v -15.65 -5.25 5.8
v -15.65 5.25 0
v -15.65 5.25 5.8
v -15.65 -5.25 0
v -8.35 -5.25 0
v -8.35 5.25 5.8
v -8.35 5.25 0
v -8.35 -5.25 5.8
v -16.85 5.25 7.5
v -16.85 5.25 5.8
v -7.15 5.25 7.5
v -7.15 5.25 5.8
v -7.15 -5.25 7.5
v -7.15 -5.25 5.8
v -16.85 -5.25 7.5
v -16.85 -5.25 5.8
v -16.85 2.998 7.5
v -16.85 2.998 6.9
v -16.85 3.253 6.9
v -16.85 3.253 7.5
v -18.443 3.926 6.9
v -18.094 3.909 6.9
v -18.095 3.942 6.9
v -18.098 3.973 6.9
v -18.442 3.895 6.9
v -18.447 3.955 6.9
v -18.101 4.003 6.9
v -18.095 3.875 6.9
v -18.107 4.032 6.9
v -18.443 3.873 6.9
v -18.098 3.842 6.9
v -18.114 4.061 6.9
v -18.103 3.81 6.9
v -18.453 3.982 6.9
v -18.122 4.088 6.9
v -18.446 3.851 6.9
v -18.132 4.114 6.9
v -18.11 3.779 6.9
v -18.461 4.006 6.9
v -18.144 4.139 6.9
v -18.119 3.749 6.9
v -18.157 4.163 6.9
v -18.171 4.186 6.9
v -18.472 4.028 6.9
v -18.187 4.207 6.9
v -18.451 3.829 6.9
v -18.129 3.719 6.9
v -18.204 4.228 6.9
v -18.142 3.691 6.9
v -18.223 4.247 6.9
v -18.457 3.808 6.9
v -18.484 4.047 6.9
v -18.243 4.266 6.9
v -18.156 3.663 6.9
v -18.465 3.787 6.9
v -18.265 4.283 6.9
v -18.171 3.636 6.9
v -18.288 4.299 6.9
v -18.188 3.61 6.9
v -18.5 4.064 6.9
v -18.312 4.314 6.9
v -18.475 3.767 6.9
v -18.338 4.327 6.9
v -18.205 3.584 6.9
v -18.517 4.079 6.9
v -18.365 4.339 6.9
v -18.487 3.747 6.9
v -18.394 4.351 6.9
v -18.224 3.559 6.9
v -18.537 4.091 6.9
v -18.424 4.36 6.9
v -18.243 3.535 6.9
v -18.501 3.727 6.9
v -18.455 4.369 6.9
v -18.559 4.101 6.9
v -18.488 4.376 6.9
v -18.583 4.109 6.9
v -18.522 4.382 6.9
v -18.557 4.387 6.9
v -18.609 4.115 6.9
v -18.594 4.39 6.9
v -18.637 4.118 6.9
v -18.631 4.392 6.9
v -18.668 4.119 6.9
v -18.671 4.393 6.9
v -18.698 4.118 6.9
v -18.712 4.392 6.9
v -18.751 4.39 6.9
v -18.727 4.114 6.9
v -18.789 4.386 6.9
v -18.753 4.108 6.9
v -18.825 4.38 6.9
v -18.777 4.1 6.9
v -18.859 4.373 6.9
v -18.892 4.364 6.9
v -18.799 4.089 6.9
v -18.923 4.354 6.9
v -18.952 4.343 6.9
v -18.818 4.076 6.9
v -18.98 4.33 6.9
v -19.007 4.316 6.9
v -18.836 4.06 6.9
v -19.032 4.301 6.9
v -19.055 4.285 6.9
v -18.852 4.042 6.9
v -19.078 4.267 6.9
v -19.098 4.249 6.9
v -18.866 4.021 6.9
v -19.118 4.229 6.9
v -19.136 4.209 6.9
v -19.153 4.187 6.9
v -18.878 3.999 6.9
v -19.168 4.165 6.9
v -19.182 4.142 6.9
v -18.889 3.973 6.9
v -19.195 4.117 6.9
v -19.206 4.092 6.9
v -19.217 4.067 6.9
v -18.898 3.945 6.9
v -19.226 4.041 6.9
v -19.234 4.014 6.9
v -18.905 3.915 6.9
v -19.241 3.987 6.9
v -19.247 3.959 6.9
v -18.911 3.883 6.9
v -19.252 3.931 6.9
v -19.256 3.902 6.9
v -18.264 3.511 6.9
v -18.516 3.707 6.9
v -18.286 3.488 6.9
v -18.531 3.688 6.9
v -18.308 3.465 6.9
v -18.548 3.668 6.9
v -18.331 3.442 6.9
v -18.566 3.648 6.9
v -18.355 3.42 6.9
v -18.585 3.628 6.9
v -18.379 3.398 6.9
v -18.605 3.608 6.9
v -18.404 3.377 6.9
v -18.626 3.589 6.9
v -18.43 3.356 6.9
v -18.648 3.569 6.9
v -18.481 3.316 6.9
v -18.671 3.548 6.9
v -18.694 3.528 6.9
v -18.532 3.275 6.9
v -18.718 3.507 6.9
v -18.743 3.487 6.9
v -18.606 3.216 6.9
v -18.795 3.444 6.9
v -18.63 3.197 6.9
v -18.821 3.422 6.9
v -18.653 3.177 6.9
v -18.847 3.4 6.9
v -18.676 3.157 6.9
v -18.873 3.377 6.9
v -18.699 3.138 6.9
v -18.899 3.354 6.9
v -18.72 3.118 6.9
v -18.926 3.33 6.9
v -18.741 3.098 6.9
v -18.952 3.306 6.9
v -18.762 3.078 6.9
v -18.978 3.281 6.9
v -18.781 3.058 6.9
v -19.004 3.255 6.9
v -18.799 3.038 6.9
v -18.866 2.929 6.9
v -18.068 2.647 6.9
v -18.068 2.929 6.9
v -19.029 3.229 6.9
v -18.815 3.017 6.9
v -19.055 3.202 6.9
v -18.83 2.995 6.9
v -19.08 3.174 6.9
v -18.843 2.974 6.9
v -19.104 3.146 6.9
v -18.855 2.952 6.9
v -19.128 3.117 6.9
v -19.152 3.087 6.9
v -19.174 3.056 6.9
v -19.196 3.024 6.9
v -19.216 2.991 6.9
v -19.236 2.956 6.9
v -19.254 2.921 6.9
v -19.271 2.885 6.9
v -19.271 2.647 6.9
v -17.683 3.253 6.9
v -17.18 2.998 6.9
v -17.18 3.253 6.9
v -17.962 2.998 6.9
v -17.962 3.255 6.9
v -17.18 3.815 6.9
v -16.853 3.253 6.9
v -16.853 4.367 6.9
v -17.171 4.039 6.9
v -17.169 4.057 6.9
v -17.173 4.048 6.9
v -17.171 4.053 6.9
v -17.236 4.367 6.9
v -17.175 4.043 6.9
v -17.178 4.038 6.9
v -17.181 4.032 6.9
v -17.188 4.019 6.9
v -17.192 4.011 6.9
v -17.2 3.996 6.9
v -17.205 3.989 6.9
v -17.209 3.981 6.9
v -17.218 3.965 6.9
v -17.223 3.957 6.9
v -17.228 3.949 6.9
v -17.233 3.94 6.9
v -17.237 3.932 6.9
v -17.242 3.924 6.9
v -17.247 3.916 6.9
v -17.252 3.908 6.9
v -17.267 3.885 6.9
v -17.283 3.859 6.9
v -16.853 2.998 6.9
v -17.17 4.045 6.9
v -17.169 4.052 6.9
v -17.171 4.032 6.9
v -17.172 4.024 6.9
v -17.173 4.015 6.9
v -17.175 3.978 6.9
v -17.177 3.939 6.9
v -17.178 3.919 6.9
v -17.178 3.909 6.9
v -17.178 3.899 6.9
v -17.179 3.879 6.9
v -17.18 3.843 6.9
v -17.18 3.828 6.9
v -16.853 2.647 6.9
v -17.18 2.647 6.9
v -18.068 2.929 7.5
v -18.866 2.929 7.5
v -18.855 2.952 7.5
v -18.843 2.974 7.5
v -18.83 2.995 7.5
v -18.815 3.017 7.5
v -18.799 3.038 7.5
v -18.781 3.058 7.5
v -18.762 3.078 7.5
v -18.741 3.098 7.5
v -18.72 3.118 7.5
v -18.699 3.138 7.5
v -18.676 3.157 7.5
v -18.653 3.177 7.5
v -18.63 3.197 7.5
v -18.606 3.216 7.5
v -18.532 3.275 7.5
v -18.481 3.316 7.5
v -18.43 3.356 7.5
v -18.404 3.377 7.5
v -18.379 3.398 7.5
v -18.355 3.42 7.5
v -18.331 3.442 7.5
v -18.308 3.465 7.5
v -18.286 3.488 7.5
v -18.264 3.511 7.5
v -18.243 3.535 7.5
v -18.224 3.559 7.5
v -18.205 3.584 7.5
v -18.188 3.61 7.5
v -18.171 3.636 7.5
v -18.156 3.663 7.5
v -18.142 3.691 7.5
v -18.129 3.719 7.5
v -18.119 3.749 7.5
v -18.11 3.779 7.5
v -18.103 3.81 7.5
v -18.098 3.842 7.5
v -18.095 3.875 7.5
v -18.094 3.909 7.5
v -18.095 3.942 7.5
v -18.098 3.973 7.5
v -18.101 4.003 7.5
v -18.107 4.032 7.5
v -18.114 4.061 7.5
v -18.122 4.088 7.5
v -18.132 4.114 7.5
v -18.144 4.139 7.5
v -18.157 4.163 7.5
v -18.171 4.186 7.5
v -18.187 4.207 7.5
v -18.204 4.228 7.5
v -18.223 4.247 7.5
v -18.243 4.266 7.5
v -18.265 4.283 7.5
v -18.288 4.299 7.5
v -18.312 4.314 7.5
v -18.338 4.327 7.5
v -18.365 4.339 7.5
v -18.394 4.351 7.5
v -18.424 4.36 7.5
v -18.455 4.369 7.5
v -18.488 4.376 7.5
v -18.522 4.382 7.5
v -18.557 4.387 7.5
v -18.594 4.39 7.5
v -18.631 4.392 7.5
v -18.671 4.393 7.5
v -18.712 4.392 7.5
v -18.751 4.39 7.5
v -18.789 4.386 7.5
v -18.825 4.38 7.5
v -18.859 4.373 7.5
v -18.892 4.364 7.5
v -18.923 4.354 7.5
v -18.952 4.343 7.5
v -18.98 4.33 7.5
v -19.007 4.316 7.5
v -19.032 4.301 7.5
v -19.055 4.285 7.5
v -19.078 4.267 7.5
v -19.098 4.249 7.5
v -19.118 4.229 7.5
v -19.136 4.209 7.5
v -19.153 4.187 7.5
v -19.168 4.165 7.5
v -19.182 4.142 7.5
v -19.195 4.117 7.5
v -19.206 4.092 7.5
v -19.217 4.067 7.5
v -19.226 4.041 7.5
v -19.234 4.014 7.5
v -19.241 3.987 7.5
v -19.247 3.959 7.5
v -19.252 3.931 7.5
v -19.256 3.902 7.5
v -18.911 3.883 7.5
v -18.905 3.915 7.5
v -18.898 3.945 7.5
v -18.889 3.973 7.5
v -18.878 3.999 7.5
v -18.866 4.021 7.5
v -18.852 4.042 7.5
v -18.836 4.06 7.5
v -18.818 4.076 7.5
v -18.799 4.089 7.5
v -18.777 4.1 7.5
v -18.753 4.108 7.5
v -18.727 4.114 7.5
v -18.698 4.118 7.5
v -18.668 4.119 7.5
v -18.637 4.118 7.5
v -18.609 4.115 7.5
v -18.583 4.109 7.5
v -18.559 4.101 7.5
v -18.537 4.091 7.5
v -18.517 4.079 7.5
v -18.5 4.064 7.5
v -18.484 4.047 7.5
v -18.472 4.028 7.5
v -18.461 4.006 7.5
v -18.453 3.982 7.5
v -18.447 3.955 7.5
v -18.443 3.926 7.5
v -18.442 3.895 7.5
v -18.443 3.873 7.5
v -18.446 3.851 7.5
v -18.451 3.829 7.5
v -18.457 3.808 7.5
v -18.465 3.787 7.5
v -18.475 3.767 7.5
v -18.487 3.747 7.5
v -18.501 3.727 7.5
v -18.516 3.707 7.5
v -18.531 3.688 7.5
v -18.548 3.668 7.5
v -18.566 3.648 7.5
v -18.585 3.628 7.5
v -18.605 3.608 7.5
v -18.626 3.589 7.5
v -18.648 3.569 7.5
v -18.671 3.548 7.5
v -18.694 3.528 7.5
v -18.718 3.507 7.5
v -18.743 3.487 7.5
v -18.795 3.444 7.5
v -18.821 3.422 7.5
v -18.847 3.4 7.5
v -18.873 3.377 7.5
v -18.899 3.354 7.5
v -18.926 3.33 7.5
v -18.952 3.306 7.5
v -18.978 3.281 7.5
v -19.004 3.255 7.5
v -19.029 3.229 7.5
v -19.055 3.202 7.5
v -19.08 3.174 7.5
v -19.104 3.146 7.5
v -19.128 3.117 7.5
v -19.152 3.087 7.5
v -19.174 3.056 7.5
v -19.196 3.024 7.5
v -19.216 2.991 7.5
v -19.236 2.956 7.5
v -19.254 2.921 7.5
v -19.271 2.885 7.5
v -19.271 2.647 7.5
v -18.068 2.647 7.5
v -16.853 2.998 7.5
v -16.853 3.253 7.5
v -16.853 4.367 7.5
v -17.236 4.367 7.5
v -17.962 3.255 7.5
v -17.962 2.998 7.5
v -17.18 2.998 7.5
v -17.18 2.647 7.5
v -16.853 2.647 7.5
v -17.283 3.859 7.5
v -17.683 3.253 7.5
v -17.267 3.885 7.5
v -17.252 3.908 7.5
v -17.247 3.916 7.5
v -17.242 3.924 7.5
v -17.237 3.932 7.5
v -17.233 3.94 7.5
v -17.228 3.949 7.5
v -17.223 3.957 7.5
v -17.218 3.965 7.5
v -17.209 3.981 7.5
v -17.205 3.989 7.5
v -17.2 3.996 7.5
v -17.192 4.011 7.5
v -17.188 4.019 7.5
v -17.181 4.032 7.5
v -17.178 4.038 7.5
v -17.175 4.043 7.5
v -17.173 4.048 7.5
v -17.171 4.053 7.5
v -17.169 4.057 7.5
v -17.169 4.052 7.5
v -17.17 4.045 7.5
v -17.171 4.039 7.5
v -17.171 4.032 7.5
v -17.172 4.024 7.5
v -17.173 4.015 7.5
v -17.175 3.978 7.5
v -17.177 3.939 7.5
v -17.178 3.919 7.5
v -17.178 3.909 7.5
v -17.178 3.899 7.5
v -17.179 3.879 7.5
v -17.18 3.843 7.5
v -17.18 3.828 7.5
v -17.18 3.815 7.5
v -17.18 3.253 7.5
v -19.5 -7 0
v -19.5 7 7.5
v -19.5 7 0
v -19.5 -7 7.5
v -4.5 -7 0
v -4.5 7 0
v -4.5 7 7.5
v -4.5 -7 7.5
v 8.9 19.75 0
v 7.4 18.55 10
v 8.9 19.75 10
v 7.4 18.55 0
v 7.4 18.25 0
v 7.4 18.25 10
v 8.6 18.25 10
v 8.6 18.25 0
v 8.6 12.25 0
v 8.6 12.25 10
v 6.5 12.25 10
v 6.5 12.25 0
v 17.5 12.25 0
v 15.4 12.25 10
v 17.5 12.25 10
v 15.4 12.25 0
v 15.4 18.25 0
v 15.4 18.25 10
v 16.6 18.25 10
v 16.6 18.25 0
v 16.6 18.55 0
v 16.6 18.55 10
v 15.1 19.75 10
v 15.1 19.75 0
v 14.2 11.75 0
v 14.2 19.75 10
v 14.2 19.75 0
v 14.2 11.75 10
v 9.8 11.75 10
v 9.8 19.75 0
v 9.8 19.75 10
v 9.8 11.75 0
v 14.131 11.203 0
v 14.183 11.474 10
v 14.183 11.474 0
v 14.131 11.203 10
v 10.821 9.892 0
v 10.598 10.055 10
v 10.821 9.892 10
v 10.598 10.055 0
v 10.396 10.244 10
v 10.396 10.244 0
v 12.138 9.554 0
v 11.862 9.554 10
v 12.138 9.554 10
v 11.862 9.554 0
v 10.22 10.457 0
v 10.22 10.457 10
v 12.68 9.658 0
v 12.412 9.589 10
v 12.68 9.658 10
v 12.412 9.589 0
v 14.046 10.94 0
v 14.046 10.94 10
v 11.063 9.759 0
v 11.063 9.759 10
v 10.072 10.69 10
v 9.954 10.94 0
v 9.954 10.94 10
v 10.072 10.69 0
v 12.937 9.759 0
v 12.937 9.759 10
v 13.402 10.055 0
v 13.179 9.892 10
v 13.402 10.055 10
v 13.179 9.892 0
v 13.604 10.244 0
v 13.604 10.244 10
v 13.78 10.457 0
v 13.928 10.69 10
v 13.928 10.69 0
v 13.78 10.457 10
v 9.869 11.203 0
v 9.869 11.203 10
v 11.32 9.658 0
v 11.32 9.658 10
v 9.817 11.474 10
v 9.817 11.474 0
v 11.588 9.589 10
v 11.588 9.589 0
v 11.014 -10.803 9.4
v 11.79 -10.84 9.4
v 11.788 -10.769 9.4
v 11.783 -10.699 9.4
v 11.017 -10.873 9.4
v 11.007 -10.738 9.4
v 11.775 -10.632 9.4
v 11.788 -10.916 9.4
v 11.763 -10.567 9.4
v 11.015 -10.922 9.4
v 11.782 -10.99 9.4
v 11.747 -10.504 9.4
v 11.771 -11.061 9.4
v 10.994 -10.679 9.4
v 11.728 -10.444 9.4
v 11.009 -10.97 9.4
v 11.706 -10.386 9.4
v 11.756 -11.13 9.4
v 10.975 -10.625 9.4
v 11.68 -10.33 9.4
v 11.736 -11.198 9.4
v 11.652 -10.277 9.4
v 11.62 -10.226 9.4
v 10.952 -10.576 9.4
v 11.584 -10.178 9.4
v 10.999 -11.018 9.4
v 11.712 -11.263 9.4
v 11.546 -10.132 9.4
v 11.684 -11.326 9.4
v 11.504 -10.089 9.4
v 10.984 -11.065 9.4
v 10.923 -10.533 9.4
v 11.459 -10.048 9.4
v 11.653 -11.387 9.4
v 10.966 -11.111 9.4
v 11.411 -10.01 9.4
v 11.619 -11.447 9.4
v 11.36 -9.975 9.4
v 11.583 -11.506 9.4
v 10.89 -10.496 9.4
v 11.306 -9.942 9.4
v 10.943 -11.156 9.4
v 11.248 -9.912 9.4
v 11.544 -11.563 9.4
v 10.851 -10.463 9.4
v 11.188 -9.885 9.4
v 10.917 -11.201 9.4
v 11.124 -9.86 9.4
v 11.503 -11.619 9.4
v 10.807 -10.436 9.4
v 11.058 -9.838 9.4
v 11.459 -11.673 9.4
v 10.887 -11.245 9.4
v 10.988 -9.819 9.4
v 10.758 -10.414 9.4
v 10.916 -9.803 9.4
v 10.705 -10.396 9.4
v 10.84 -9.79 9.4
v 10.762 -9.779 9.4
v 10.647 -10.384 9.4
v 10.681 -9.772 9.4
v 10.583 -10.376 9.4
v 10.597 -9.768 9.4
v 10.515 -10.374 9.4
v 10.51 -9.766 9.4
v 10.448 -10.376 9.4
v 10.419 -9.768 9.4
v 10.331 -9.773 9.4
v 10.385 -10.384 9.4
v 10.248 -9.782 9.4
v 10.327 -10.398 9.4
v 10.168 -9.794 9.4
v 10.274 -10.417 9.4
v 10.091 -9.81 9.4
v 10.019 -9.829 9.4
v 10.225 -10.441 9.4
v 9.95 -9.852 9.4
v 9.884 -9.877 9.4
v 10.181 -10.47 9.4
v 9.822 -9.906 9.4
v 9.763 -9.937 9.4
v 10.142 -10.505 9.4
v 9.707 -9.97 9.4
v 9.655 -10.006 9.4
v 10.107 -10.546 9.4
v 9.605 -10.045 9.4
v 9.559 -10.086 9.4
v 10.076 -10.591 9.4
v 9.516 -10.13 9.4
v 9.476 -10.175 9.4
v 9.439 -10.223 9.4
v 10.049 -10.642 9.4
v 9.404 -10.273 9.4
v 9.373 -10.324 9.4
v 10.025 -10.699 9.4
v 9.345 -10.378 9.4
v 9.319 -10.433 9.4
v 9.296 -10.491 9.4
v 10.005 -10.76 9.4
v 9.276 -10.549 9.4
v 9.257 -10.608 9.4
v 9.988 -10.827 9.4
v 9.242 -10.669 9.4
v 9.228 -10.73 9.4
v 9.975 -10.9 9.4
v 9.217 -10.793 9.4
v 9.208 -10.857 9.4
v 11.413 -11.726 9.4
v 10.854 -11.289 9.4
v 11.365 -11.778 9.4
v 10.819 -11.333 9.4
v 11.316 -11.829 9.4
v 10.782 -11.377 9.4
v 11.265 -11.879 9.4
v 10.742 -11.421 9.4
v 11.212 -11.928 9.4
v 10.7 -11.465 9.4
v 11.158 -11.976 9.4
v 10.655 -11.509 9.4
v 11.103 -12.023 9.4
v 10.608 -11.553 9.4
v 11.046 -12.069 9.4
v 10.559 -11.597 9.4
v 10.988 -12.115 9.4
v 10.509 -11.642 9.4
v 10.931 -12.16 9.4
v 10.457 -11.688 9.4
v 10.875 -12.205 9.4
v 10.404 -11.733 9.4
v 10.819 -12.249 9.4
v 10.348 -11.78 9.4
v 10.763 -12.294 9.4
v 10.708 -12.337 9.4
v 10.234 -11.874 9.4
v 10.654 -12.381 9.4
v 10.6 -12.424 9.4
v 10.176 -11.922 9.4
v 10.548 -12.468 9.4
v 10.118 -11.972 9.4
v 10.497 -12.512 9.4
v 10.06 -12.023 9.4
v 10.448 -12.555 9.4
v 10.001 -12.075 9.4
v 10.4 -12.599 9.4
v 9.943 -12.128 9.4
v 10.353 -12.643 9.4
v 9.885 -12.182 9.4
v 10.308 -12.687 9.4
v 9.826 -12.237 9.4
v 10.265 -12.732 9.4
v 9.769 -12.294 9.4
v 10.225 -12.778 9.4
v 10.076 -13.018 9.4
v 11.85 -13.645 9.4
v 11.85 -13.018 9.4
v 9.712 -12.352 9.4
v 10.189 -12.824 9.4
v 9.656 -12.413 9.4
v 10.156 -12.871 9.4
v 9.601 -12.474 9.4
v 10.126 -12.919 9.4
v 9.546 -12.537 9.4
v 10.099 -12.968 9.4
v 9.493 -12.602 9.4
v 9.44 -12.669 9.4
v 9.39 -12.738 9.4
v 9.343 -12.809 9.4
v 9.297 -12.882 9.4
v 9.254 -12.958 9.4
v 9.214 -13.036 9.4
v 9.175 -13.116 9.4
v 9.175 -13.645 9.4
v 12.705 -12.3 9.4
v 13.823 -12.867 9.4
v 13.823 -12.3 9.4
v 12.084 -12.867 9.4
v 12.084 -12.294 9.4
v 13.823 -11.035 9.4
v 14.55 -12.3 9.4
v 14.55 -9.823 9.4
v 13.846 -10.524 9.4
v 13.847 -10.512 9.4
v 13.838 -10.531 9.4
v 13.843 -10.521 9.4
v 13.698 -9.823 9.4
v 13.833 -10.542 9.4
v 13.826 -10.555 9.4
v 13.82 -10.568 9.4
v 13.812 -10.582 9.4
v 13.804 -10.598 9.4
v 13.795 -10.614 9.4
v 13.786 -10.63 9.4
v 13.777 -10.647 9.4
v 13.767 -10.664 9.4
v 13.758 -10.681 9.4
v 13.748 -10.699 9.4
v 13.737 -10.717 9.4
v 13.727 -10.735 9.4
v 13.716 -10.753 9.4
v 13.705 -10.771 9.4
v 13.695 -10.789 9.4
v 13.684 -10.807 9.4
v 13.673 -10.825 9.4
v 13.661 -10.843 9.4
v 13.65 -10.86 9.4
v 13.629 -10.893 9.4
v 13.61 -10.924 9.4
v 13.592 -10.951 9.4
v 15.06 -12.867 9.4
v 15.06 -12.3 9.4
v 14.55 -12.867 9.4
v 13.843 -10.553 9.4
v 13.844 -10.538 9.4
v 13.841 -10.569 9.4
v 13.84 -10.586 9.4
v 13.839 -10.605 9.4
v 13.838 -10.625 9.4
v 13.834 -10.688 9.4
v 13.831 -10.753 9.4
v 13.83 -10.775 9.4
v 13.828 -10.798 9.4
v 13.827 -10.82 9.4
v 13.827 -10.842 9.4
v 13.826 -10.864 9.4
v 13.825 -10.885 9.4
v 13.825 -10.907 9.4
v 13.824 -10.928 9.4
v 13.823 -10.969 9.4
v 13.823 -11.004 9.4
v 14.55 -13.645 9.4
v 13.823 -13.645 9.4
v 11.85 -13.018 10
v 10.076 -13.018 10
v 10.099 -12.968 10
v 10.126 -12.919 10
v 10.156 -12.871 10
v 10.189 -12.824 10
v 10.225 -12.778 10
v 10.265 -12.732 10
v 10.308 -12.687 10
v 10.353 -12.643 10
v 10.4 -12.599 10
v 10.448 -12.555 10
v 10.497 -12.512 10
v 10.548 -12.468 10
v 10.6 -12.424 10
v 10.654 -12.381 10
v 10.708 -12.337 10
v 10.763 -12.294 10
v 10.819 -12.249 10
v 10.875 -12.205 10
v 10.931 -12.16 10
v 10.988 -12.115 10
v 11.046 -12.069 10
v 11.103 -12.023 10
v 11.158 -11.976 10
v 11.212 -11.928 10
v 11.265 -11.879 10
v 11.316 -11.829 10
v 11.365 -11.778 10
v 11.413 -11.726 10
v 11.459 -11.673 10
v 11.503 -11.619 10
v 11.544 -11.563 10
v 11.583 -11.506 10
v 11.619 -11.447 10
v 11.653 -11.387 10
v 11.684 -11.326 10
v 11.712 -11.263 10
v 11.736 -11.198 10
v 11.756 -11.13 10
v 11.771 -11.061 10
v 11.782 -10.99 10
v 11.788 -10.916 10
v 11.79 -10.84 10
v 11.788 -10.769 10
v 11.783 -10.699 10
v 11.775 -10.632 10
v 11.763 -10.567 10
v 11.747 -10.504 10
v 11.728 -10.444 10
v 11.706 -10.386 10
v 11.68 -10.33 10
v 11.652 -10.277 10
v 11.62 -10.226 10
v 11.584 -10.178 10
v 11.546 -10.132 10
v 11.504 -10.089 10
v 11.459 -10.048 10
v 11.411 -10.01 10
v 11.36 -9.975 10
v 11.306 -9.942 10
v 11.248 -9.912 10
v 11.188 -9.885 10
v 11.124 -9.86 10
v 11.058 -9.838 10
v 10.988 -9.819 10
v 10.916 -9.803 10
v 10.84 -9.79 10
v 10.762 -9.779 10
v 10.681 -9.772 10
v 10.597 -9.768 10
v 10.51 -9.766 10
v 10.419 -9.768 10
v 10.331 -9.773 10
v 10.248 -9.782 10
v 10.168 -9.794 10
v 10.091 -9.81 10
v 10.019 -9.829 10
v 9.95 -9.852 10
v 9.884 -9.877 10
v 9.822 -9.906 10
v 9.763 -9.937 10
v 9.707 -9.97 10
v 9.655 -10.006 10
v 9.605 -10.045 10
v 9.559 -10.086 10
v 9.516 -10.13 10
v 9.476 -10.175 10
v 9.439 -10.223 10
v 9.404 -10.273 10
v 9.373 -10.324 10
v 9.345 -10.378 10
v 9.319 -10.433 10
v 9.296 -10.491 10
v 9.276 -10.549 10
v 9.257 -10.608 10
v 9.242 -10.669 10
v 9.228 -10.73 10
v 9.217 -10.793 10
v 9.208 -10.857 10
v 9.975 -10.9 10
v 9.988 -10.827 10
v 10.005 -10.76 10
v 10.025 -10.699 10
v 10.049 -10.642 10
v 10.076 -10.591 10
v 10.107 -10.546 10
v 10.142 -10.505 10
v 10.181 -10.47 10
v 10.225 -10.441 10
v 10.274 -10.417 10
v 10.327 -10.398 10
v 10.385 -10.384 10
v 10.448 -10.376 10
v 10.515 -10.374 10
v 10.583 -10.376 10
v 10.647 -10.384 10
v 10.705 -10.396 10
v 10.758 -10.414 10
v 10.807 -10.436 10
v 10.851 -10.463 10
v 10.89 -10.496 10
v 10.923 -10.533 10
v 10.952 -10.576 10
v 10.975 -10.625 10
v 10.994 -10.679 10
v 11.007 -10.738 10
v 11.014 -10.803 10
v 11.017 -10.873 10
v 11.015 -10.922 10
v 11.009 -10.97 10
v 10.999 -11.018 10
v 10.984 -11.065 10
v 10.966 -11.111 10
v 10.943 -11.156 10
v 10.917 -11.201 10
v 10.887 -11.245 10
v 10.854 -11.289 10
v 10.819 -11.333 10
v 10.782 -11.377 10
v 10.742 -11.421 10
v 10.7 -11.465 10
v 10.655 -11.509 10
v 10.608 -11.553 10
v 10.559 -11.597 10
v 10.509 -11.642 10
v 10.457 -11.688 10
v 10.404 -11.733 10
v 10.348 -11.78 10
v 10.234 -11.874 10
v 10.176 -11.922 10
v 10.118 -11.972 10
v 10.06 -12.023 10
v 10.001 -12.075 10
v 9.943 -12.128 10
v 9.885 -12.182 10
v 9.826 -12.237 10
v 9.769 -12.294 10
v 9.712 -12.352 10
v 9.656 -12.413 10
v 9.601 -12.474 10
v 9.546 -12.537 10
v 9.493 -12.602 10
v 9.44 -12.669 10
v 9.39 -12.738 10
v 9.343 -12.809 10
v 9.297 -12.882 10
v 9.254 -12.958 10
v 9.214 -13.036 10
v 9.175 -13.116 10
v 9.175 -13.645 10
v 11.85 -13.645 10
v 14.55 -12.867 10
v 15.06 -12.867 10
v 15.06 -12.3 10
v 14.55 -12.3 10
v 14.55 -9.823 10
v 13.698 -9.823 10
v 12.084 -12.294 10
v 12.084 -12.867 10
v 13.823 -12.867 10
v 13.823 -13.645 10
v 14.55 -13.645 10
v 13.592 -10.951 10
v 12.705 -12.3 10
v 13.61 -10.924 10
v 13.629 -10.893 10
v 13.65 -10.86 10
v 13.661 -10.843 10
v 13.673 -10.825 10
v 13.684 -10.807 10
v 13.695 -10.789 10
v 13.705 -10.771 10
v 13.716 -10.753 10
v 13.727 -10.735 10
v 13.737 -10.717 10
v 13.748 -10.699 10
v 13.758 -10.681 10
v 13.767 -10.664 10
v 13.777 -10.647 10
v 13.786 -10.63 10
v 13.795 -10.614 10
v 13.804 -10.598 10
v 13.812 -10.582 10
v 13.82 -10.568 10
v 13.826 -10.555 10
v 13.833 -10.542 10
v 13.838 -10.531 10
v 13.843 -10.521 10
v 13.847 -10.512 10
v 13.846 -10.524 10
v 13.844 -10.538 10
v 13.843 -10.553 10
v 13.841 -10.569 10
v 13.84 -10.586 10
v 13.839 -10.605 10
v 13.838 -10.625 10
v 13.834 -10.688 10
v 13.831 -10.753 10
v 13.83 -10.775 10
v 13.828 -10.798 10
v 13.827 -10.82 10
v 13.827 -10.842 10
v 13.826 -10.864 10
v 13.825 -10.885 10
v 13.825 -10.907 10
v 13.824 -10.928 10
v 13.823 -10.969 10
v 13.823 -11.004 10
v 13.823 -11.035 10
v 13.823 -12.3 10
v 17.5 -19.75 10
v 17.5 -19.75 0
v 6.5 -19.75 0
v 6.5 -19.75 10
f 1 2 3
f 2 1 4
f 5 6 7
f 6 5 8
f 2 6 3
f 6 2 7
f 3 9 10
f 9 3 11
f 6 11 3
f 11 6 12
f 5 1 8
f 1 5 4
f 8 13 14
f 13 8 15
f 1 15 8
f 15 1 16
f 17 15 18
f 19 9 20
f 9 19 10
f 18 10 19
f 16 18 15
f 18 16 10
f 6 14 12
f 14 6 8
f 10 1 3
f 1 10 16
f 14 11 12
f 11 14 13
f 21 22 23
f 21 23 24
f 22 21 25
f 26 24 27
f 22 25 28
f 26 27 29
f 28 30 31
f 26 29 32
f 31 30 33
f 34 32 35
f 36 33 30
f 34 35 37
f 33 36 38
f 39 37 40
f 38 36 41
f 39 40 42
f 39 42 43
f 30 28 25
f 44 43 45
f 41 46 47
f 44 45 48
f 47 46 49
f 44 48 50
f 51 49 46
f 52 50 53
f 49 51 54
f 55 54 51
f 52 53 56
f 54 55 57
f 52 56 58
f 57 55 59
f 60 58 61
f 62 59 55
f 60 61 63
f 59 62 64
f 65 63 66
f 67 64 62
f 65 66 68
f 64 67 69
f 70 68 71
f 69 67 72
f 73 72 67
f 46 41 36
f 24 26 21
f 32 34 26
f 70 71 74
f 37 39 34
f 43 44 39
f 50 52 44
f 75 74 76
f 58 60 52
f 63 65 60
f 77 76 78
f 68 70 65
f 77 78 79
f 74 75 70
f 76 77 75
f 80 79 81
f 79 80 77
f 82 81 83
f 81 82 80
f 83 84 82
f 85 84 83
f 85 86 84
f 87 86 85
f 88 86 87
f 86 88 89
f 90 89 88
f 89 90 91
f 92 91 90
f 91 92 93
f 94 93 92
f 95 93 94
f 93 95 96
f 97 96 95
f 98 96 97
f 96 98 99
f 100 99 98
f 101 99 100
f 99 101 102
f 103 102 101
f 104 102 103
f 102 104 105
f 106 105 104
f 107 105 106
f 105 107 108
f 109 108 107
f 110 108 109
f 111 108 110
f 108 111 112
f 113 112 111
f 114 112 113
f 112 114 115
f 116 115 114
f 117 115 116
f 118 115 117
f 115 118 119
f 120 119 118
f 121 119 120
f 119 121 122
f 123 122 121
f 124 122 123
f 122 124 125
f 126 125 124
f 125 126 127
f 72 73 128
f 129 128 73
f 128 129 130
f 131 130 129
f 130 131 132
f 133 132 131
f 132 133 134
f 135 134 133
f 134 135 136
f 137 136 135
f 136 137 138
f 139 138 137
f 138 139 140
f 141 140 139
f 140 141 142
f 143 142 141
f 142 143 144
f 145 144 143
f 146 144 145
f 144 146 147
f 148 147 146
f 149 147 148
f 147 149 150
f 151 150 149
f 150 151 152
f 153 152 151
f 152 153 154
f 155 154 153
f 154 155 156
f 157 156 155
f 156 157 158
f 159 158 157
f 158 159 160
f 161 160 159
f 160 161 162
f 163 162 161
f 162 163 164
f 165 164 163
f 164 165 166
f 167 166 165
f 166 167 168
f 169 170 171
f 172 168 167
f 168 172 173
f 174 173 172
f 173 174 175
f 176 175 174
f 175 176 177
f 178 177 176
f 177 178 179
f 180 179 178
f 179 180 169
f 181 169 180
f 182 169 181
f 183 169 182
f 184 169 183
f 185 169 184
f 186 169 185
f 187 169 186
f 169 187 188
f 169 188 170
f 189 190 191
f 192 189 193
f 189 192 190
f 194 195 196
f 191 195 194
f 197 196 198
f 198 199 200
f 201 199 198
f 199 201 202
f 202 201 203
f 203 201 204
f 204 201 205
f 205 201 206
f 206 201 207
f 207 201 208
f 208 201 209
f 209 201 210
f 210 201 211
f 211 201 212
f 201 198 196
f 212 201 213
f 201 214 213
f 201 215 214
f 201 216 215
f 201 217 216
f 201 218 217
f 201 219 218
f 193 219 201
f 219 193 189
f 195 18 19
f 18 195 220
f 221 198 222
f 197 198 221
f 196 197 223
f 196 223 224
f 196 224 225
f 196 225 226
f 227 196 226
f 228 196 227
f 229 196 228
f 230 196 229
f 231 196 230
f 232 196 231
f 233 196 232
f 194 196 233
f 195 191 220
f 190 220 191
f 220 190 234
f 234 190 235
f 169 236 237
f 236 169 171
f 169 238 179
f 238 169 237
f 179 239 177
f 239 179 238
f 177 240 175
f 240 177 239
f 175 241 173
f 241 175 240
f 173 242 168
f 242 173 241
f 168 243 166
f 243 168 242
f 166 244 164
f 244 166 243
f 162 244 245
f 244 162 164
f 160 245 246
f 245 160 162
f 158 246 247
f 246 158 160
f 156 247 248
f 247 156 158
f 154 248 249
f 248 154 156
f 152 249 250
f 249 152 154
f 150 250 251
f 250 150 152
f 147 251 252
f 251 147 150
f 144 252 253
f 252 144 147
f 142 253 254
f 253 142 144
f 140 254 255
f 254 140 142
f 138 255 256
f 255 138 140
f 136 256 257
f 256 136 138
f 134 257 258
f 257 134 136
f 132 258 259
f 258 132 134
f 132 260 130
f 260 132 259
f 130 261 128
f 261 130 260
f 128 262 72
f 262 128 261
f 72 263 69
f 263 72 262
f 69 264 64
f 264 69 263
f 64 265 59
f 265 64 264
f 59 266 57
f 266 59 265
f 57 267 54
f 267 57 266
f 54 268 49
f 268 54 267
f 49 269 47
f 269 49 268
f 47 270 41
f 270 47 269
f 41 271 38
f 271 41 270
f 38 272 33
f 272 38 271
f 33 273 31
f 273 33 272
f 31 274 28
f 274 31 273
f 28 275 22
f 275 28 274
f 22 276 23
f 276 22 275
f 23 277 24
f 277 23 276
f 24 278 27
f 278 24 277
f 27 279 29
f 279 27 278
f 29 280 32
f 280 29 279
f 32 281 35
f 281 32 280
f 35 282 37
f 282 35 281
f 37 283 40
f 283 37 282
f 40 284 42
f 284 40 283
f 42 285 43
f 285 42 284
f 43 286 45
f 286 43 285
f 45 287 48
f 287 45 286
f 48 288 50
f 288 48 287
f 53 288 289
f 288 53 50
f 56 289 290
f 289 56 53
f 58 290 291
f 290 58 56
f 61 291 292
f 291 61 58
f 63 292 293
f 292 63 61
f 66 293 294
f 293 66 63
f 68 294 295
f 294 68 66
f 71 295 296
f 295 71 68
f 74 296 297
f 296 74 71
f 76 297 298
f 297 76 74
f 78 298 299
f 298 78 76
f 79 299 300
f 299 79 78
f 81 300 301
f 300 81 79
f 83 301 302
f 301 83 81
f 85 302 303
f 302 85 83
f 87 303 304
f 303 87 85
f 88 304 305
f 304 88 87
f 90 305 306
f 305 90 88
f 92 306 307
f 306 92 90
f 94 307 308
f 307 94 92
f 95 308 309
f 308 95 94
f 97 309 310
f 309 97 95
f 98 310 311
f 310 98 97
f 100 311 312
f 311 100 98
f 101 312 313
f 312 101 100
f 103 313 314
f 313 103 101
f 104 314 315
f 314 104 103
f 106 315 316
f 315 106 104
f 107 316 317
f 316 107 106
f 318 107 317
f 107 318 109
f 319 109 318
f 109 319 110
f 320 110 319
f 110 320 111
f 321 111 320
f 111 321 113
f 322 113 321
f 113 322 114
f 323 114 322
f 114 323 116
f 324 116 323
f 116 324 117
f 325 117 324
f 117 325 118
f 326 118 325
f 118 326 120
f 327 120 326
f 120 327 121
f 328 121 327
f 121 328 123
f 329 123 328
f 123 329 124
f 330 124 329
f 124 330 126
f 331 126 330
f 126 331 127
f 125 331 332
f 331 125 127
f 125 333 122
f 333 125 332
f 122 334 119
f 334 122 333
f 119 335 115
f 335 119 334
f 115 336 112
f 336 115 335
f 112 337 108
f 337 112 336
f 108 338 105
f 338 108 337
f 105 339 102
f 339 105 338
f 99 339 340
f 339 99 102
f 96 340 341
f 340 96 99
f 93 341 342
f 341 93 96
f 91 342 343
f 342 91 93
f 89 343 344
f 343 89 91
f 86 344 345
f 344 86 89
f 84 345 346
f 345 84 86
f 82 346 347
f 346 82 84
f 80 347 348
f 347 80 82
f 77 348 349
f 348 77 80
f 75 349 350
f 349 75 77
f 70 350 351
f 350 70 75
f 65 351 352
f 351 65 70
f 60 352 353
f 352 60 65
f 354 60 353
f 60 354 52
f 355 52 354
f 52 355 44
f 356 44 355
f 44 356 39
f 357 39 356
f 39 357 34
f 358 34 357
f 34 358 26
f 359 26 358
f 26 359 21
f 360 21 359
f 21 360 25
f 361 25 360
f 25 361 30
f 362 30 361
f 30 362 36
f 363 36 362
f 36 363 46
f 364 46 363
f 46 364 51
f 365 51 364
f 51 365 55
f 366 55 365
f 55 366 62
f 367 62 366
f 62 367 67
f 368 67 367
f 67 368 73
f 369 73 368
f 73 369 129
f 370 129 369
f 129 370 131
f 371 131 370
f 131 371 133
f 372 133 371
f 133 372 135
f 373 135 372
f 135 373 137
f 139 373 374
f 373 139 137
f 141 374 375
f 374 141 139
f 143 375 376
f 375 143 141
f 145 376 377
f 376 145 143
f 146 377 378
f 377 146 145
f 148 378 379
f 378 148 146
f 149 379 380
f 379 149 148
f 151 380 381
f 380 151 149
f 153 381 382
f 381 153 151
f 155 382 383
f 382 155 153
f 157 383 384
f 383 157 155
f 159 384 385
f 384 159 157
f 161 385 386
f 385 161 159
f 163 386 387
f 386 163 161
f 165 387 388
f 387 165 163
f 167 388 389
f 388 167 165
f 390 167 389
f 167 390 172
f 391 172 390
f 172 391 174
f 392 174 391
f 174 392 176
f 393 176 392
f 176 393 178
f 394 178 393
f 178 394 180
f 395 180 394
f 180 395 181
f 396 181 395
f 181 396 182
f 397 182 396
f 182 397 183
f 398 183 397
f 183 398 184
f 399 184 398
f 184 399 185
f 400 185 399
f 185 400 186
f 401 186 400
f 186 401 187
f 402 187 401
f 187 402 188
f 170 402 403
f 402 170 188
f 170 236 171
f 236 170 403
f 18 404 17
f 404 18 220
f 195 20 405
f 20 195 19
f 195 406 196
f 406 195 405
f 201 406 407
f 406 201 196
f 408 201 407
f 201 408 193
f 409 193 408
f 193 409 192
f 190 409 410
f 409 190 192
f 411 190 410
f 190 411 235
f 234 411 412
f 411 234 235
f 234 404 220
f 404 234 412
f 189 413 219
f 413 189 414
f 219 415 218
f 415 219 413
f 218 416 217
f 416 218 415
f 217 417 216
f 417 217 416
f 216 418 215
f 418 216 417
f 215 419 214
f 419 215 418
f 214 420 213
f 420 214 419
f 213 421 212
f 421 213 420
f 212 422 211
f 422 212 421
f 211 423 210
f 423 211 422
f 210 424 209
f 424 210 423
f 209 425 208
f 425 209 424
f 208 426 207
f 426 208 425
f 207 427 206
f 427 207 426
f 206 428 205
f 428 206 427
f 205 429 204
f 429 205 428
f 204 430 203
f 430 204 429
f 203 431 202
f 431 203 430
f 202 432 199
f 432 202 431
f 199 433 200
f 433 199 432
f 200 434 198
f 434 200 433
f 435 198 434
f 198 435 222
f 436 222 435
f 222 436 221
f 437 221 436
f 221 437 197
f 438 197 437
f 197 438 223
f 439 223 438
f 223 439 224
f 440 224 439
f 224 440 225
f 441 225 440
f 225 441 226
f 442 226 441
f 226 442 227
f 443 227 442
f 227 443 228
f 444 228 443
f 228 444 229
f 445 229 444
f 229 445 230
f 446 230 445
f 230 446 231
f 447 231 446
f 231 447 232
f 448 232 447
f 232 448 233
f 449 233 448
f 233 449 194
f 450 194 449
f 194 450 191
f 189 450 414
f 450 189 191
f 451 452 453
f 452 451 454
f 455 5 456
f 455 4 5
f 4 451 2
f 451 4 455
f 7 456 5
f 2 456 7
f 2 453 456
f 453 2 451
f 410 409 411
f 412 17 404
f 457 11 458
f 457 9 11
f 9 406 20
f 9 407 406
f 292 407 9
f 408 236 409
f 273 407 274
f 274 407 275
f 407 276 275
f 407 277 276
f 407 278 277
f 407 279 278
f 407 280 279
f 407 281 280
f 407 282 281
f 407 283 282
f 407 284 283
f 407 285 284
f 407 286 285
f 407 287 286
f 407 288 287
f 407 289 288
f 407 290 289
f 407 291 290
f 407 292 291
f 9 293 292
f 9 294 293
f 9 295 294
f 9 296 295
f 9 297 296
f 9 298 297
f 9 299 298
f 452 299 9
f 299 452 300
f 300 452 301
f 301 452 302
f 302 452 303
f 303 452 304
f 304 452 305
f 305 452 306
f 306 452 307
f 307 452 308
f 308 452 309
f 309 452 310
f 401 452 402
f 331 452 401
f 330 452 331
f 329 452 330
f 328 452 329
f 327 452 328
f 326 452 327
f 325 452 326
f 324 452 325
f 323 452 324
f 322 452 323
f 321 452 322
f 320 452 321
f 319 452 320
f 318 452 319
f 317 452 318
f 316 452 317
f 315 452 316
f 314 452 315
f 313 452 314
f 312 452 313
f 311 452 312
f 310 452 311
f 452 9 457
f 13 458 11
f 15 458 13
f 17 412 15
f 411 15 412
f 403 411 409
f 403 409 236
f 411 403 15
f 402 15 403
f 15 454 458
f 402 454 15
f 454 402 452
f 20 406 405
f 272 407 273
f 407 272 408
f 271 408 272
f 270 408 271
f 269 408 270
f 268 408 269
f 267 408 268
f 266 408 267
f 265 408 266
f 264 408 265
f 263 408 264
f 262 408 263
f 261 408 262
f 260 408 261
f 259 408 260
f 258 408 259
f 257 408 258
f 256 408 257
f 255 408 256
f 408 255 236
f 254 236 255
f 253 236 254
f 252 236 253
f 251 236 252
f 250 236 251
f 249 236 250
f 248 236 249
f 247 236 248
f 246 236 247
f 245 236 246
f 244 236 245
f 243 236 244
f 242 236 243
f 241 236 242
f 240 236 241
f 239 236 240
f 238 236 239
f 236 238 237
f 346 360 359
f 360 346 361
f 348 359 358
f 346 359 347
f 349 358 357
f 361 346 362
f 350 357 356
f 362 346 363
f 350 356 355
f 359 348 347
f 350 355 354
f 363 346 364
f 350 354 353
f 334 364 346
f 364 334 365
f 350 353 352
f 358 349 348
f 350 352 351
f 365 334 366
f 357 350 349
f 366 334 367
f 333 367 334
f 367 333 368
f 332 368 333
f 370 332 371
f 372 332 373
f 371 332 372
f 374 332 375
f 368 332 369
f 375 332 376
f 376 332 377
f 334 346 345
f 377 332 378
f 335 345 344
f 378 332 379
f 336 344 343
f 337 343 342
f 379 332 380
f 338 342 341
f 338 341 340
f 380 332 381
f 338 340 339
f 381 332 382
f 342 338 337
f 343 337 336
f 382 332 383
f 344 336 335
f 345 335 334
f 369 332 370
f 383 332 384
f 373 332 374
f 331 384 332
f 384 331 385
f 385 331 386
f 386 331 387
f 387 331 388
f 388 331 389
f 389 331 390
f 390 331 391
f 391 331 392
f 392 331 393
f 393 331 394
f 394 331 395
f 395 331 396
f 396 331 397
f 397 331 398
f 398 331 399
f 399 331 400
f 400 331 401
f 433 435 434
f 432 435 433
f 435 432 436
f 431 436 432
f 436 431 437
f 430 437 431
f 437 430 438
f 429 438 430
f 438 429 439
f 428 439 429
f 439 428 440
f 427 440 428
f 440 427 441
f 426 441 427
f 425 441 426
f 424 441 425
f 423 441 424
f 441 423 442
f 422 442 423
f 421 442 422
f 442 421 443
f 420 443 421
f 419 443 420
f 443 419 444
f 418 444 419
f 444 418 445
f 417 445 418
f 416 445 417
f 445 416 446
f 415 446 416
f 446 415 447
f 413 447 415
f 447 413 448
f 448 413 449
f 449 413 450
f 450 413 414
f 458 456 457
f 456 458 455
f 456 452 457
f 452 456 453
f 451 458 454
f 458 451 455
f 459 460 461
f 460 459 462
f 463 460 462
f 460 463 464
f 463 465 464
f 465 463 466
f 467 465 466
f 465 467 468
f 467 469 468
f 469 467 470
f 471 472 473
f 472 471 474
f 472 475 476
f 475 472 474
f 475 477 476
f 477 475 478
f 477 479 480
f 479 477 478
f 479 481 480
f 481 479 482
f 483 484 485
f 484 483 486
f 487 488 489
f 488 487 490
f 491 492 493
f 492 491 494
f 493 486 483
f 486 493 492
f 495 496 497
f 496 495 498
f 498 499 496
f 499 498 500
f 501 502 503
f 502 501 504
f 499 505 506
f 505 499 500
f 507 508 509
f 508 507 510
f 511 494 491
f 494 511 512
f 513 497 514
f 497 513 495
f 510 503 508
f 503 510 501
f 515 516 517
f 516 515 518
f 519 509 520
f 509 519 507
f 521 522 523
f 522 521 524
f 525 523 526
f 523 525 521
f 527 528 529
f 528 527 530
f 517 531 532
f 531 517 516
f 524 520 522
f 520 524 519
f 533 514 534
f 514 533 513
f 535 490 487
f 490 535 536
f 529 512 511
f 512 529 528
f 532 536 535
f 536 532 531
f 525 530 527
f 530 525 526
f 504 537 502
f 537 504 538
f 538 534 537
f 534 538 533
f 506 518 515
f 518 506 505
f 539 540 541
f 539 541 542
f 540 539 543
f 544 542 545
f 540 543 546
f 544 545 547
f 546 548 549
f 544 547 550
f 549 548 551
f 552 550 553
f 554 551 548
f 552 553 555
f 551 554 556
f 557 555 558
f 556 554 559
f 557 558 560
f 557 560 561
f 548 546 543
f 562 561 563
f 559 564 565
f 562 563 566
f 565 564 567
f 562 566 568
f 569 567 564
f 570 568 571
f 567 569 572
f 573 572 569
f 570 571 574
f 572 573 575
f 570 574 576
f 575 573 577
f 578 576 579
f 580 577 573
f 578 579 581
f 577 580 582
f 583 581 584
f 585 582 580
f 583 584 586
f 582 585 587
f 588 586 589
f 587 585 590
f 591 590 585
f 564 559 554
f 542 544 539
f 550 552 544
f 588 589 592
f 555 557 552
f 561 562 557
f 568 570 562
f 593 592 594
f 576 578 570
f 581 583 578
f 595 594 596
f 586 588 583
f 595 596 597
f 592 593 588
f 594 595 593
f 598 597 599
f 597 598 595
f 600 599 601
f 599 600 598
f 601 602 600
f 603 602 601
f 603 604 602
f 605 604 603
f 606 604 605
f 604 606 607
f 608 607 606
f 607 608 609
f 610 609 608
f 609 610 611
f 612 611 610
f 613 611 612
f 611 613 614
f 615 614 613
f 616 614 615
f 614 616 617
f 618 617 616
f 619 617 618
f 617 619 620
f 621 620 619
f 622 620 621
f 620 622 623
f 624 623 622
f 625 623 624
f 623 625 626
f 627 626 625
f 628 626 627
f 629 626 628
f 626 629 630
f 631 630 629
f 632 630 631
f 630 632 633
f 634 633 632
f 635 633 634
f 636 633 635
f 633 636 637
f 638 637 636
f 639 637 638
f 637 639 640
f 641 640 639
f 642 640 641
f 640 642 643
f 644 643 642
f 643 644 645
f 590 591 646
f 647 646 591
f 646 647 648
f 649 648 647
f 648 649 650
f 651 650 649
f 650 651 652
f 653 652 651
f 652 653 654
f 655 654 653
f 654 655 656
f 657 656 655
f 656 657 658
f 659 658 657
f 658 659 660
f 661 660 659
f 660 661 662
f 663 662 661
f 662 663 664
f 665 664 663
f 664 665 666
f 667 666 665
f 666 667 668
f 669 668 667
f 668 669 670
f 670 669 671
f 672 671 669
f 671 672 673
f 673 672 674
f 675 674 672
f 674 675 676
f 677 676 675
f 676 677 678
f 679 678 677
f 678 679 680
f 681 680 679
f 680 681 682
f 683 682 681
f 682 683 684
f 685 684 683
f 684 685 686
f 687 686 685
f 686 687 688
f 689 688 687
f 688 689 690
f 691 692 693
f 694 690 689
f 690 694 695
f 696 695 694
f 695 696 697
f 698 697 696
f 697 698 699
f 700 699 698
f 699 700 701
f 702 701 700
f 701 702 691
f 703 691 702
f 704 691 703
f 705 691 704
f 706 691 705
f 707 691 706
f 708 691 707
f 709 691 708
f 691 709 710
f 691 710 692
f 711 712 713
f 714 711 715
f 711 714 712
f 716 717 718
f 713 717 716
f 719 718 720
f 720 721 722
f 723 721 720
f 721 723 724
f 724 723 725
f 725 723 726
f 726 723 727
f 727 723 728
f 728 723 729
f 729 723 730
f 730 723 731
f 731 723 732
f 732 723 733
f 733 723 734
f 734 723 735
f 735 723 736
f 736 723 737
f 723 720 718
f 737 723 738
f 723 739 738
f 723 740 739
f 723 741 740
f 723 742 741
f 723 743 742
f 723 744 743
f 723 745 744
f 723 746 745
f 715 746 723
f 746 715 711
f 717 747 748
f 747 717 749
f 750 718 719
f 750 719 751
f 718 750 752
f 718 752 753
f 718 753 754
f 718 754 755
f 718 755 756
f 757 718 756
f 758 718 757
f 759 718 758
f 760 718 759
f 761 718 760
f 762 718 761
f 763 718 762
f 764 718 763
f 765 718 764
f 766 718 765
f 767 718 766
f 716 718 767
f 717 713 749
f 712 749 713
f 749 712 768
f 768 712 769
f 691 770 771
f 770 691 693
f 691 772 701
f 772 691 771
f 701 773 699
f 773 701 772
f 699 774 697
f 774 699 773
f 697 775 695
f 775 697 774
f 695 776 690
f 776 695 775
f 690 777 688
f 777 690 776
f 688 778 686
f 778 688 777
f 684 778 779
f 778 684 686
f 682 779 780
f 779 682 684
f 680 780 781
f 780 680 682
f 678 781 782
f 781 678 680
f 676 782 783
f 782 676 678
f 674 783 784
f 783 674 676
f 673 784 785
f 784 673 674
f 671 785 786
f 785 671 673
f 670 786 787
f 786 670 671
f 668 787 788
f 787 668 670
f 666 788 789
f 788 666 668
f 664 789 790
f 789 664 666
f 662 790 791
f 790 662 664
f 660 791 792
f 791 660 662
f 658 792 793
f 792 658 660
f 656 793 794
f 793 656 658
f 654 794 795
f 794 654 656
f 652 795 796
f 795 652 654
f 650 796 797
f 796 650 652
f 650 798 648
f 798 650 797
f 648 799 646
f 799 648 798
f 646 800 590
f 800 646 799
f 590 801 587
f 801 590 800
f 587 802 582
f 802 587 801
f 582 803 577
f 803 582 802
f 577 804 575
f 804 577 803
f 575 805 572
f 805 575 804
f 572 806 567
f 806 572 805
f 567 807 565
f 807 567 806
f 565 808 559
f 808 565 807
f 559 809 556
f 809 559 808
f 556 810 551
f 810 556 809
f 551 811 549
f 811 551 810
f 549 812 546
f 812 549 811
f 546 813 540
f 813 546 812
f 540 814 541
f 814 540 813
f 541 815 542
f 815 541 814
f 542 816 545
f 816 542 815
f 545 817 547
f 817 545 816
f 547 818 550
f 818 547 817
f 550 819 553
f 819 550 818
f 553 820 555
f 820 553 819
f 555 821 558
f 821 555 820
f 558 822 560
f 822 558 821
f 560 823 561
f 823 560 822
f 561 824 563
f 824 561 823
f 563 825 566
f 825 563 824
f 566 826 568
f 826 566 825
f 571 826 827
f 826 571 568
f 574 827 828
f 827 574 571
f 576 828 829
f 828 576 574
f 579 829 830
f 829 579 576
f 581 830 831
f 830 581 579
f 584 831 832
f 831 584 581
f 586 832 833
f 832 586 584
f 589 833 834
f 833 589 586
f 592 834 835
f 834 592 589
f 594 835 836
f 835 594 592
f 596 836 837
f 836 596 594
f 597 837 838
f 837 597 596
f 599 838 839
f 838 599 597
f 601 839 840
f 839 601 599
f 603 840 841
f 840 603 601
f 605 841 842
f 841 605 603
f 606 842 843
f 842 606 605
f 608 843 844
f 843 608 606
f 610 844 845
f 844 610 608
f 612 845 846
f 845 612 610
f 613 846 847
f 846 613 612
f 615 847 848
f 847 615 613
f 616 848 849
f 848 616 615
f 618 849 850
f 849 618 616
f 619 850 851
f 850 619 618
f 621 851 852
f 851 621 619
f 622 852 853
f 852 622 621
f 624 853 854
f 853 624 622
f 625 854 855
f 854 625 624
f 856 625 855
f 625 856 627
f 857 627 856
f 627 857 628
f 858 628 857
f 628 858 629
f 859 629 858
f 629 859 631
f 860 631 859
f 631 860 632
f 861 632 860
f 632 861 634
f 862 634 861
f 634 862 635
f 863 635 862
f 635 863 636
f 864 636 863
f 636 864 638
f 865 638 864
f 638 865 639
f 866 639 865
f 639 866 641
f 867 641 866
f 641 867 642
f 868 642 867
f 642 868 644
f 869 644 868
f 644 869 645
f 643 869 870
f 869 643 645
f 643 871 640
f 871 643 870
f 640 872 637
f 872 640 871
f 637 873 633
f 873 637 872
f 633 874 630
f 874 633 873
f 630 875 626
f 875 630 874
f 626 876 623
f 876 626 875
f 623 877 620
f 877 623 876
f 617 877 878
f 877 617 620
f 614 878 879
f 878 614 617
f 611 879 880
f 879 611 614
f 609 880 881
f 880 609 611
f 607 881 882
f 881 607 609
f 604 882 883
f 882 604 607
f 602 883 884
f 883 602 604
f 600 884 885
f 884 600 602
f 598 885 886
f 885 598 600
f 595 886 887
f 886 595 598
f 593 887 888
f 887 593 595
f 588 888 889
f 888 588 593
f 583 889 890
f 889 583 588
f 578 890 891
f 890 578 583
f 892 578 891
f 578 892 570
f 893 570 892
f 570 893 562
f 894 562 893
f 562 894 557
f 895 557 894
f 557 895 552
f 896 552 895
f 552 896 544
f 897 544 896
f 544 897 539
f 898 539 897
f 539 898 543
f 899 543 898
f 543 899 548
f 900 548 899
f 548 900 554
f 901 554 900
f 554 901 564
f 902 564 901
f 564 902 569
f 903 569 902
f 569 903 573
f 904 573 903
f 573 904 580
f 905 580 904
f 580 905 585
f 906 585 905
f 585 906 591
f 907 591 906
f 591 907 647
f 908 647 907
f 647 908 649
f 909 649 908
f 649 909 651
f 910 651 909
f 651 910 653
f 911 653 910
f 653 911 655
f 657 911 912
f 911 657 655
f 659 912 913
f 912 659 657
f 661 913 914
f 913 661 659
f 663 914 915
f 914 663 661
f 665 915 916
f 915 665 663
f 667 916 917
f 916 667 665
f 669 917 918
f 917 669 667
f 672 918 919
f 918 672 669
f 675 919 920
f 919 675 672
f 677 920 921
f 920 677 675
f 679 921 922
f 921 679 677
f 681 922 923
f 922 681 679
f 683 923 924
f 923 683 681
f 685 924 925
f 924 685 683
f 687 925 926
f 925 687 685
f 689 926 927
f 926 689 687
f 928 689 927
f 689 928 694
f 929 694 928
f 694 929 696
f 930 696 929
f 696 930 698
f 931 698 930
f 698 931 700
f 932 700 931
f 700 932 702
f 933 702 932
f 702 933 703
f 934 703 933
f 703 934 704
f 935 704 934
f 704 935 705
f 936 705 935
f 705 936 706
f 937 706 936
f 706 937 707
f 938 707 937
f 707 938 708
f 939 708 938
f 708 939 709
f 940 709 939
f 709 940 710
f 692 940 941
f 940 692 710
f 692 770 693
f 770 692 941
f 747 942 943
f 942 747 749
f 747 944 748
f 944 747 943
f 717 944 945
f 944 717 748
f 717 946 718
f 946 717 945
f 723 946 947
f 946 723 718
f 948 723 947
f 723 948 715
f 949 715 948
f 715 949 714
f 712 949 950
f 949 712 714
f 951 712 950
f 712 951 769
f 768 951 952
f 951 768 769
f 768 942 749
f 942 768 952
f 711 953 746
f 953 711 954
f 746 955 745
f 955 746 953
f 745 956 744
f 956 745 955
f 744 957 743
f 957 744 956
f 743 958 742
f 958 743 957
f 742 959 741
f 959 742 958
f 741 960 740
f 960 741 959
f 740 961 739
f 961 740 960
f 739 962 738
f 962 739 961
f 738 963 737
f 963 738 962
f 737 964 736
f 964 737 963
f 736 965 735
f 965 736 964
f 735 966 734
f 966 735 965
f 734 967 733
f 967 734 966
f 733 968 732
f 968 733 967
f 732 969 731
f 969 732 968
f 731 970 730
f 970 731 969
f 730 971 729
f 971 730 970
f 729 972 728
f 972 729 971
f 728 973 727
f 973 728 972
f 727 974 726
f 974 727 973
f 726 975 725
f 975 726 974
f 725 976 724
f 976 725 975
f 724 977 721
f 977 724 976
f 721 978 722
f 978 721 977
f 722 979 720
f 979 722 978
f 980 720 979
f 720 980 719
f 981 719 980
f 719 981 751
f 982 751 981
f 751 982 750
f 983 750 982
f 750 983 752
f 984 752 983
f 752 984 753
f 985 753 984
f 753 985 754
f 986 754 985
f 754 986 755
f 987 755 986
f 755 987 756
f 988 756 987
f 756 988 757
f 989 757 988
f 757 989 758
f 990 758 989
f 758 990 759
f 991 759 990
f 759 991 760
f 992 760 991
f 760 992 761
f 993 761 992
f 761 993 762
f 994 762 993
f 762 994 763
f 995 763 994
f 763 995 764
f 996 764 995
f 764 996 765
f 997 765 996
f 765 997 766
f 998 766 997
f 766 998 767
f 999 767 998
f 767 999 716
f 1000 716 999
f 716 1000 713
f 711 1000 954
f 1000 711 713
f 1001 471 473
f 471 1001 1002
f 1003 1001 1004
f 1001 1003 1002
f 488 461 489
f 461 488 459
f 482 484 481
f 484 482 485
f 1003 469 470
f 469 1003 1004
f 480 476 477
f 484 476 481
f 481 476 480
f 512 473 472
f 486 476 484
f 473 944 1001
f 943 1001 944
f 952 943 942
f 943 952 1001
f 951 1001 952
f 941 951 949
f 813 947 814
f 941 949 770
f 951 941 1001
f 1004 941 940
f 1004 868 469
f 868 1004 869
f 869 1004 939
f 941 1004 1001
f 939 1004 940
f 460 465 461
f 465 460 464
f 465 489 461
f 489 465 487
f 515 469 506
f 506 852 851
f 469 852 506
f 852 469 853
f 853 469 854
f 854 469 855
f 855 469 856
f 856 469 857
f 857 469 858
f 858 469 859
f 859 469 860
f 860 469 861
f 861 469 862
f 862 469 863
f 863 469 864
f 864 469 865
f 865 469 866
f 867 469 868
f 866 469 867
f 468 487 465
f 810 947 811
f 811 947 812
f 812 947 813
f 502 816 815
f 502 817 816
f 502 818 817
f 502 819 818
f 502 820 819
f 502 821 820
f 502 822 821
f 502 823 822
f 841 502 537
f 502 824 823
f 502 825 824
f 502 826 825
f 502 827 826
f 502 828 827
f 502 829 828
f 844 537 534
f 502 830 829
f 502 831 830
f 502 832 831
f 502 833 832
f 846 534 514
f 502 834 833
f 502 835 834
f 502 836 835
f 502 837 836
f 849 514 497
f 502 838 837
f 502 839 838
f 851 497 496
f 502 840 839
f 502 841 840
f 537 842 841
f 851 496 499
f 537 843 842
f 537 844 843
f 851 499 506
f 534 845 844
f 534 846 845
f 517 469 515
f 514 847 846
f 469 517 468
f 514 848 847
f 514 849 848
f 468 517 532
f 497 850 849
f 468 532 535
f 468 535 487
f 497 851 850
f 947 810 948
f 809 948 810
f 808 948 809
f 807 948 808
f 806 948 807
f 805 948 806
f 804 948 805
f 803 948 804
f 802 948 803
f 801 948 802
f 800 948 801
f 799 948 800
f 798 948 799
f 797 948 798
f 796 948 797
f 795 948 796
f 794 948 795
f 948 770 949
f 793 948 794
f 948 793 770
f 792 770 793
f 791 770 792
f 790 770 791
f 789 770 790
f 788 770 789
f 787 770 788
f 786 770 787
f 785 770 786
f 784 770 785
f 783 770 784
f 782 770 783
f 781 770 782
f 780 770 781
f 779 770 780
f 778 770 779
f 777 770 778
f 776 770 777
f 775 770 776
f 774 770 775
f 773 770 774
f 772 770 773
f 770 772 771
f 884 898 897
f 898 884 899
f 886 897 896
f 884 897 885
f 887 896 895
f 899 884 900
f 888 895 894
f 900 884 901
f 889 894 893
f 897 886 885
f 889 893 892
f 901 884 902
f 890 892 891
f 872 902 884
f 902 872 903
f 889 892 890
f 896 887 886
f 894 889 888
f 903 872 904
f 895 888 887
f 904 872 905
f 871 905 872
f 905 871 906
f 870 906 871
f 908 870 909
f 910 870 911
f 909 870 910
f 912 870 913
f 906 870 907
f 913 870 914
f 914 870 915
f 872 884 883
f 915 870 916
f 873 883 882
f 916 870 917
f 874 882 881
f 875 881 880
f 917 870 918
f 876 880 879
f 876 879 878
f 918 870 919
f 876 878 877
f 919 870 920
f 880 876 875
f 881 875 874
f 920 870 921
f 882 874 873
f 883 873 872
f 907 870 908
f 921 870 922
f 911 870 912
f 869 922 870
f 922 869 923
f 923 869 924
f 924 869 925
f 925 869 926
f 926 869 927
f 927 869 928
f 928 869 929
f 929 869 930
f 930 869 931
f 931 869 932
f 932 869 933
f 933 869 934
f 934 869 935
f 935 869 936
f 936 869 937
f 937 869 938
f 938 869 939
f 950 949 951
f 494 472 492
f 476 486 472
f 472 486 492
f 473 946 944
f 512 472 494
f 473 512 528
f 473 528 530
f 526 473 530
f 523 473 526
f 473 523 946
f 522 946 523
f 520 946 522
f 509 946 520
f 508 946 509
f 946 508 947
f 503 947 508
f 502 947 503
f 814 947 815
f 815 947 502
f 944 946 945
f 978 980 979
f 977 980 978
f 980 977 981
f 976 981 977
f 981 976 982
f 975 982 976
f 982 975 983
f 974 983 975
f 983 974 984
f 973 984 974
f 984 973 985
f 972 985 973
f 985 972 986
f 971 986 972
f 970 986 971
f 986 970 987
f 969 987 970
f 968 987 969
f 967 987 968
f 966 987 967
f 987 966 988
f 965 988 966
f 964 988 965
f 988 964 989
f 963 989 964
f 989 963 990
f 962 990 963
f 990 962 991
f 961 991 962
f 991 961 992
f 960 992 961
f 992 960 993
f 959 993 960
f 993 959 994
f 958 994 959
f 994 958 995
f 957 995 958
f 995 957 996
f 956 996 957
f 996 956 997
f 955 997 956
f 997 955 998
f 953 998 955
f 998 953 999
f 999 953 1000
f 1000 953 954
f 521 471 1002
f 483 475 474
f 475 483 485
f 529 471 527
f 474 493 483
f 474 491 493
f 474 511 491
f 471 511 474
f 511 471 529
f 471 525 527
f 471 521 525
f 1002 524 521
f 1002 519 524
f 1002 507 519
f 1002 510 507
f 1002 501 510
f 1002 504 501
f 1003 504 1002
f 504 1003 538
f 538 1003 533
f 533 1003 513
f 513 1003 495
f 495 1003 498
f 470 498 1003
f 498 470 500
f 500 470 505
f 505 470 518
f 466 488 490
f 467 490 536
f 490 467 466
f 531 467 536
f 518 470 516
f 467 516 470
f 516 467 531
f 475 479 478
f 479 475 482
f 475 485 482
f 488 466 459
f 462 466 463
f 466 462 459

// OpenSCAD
$fn = 50;

difference() {
	union() {
		translate(v = [-12, -5, 7.5]) {
			rotate(a = [0, 180, 0]) {
				difference() {
					union() {
						translate(v = [-7.5, -2.0, 0]) {
							cube(size = [15.0, 14.0, 7.5]);
						}
					}
					union() {
						translate(v = [-3.65, -0.25, -0.1]) {
							cube(size = [7.3, 10.5, 7.7]);
						}
						translate(v = [-4.85, -0.25, -0.1]) {
							cube(size = [9.7, 10.5, 1.8]);
						}
						translate(v = [6, 8.5, 0.6]) {
							rotate(a = [0, 180, 0]) {
								linear_extrude(height = 0.7) {
									text(font = "Arial:style=Bold", halign = "center", size = 1.8, text = "24", valign = "center");
								}
							}
						}
					}
				}
			}
		}
		translate(v = [12, 12.25, 0]) {
			rotate(a = [90, 0, 0]) {
				difference() {
					union() {
						translate(v = [-5.5, 0, -7.5]) {
							cube(size = [11.0, 10.0, 39.5]);
						}
					}
					union() {
						translate(v = [0, 10.1, 0]) {
							rotate(a = [90, 0, 0]) {
								linear_extrude(height = 10.2) {
									polygon(points = [[-3.1, -7.6], [-3.1, -7.5], [-4.6, -6.3], [-4.6, -6.0], [-3.4, -6.0], [-3.4, 0], [-5.6, 0], [-5.6, -7.6]]);
								}
							}
						}
						translate(v = [0, 10.1, 0]) {
							rotate(a = [90, 0, 0]) {
								linear_extrude(height = 10.2) {
									polygon(points = [[3.1, -7.6], [3.1, -7.5], [4.6, -6.3], [4.6, -6.0], [3.4, -6.0], [3.4, 0], [5.6, 0], [5.6, -7.6]]);
								}
							}
						}
						translate(v = [-2.2, -0.1, -7.6]) {
							cube(size = [4.4, 10.2, 8.1]);
						}
						translate(v = [0, 10.1, 0.5]) {
							rotate(a = [90, 0, 0]) {
								cylinder(h = 10.2, r = 2.2);
							}
						}
						translate(v = [0, 9.4, 24.0]) {
							rotate(a = [-90, 0, 0]) {
								linear_extrude(height = 0.7) {
									text(font = "Arial:style=Bold", halign = "center", size = 4.0, text = "24", valign = "center");
								}
							}
						}
					}
				}
			}
		}
	}
	union();
}
